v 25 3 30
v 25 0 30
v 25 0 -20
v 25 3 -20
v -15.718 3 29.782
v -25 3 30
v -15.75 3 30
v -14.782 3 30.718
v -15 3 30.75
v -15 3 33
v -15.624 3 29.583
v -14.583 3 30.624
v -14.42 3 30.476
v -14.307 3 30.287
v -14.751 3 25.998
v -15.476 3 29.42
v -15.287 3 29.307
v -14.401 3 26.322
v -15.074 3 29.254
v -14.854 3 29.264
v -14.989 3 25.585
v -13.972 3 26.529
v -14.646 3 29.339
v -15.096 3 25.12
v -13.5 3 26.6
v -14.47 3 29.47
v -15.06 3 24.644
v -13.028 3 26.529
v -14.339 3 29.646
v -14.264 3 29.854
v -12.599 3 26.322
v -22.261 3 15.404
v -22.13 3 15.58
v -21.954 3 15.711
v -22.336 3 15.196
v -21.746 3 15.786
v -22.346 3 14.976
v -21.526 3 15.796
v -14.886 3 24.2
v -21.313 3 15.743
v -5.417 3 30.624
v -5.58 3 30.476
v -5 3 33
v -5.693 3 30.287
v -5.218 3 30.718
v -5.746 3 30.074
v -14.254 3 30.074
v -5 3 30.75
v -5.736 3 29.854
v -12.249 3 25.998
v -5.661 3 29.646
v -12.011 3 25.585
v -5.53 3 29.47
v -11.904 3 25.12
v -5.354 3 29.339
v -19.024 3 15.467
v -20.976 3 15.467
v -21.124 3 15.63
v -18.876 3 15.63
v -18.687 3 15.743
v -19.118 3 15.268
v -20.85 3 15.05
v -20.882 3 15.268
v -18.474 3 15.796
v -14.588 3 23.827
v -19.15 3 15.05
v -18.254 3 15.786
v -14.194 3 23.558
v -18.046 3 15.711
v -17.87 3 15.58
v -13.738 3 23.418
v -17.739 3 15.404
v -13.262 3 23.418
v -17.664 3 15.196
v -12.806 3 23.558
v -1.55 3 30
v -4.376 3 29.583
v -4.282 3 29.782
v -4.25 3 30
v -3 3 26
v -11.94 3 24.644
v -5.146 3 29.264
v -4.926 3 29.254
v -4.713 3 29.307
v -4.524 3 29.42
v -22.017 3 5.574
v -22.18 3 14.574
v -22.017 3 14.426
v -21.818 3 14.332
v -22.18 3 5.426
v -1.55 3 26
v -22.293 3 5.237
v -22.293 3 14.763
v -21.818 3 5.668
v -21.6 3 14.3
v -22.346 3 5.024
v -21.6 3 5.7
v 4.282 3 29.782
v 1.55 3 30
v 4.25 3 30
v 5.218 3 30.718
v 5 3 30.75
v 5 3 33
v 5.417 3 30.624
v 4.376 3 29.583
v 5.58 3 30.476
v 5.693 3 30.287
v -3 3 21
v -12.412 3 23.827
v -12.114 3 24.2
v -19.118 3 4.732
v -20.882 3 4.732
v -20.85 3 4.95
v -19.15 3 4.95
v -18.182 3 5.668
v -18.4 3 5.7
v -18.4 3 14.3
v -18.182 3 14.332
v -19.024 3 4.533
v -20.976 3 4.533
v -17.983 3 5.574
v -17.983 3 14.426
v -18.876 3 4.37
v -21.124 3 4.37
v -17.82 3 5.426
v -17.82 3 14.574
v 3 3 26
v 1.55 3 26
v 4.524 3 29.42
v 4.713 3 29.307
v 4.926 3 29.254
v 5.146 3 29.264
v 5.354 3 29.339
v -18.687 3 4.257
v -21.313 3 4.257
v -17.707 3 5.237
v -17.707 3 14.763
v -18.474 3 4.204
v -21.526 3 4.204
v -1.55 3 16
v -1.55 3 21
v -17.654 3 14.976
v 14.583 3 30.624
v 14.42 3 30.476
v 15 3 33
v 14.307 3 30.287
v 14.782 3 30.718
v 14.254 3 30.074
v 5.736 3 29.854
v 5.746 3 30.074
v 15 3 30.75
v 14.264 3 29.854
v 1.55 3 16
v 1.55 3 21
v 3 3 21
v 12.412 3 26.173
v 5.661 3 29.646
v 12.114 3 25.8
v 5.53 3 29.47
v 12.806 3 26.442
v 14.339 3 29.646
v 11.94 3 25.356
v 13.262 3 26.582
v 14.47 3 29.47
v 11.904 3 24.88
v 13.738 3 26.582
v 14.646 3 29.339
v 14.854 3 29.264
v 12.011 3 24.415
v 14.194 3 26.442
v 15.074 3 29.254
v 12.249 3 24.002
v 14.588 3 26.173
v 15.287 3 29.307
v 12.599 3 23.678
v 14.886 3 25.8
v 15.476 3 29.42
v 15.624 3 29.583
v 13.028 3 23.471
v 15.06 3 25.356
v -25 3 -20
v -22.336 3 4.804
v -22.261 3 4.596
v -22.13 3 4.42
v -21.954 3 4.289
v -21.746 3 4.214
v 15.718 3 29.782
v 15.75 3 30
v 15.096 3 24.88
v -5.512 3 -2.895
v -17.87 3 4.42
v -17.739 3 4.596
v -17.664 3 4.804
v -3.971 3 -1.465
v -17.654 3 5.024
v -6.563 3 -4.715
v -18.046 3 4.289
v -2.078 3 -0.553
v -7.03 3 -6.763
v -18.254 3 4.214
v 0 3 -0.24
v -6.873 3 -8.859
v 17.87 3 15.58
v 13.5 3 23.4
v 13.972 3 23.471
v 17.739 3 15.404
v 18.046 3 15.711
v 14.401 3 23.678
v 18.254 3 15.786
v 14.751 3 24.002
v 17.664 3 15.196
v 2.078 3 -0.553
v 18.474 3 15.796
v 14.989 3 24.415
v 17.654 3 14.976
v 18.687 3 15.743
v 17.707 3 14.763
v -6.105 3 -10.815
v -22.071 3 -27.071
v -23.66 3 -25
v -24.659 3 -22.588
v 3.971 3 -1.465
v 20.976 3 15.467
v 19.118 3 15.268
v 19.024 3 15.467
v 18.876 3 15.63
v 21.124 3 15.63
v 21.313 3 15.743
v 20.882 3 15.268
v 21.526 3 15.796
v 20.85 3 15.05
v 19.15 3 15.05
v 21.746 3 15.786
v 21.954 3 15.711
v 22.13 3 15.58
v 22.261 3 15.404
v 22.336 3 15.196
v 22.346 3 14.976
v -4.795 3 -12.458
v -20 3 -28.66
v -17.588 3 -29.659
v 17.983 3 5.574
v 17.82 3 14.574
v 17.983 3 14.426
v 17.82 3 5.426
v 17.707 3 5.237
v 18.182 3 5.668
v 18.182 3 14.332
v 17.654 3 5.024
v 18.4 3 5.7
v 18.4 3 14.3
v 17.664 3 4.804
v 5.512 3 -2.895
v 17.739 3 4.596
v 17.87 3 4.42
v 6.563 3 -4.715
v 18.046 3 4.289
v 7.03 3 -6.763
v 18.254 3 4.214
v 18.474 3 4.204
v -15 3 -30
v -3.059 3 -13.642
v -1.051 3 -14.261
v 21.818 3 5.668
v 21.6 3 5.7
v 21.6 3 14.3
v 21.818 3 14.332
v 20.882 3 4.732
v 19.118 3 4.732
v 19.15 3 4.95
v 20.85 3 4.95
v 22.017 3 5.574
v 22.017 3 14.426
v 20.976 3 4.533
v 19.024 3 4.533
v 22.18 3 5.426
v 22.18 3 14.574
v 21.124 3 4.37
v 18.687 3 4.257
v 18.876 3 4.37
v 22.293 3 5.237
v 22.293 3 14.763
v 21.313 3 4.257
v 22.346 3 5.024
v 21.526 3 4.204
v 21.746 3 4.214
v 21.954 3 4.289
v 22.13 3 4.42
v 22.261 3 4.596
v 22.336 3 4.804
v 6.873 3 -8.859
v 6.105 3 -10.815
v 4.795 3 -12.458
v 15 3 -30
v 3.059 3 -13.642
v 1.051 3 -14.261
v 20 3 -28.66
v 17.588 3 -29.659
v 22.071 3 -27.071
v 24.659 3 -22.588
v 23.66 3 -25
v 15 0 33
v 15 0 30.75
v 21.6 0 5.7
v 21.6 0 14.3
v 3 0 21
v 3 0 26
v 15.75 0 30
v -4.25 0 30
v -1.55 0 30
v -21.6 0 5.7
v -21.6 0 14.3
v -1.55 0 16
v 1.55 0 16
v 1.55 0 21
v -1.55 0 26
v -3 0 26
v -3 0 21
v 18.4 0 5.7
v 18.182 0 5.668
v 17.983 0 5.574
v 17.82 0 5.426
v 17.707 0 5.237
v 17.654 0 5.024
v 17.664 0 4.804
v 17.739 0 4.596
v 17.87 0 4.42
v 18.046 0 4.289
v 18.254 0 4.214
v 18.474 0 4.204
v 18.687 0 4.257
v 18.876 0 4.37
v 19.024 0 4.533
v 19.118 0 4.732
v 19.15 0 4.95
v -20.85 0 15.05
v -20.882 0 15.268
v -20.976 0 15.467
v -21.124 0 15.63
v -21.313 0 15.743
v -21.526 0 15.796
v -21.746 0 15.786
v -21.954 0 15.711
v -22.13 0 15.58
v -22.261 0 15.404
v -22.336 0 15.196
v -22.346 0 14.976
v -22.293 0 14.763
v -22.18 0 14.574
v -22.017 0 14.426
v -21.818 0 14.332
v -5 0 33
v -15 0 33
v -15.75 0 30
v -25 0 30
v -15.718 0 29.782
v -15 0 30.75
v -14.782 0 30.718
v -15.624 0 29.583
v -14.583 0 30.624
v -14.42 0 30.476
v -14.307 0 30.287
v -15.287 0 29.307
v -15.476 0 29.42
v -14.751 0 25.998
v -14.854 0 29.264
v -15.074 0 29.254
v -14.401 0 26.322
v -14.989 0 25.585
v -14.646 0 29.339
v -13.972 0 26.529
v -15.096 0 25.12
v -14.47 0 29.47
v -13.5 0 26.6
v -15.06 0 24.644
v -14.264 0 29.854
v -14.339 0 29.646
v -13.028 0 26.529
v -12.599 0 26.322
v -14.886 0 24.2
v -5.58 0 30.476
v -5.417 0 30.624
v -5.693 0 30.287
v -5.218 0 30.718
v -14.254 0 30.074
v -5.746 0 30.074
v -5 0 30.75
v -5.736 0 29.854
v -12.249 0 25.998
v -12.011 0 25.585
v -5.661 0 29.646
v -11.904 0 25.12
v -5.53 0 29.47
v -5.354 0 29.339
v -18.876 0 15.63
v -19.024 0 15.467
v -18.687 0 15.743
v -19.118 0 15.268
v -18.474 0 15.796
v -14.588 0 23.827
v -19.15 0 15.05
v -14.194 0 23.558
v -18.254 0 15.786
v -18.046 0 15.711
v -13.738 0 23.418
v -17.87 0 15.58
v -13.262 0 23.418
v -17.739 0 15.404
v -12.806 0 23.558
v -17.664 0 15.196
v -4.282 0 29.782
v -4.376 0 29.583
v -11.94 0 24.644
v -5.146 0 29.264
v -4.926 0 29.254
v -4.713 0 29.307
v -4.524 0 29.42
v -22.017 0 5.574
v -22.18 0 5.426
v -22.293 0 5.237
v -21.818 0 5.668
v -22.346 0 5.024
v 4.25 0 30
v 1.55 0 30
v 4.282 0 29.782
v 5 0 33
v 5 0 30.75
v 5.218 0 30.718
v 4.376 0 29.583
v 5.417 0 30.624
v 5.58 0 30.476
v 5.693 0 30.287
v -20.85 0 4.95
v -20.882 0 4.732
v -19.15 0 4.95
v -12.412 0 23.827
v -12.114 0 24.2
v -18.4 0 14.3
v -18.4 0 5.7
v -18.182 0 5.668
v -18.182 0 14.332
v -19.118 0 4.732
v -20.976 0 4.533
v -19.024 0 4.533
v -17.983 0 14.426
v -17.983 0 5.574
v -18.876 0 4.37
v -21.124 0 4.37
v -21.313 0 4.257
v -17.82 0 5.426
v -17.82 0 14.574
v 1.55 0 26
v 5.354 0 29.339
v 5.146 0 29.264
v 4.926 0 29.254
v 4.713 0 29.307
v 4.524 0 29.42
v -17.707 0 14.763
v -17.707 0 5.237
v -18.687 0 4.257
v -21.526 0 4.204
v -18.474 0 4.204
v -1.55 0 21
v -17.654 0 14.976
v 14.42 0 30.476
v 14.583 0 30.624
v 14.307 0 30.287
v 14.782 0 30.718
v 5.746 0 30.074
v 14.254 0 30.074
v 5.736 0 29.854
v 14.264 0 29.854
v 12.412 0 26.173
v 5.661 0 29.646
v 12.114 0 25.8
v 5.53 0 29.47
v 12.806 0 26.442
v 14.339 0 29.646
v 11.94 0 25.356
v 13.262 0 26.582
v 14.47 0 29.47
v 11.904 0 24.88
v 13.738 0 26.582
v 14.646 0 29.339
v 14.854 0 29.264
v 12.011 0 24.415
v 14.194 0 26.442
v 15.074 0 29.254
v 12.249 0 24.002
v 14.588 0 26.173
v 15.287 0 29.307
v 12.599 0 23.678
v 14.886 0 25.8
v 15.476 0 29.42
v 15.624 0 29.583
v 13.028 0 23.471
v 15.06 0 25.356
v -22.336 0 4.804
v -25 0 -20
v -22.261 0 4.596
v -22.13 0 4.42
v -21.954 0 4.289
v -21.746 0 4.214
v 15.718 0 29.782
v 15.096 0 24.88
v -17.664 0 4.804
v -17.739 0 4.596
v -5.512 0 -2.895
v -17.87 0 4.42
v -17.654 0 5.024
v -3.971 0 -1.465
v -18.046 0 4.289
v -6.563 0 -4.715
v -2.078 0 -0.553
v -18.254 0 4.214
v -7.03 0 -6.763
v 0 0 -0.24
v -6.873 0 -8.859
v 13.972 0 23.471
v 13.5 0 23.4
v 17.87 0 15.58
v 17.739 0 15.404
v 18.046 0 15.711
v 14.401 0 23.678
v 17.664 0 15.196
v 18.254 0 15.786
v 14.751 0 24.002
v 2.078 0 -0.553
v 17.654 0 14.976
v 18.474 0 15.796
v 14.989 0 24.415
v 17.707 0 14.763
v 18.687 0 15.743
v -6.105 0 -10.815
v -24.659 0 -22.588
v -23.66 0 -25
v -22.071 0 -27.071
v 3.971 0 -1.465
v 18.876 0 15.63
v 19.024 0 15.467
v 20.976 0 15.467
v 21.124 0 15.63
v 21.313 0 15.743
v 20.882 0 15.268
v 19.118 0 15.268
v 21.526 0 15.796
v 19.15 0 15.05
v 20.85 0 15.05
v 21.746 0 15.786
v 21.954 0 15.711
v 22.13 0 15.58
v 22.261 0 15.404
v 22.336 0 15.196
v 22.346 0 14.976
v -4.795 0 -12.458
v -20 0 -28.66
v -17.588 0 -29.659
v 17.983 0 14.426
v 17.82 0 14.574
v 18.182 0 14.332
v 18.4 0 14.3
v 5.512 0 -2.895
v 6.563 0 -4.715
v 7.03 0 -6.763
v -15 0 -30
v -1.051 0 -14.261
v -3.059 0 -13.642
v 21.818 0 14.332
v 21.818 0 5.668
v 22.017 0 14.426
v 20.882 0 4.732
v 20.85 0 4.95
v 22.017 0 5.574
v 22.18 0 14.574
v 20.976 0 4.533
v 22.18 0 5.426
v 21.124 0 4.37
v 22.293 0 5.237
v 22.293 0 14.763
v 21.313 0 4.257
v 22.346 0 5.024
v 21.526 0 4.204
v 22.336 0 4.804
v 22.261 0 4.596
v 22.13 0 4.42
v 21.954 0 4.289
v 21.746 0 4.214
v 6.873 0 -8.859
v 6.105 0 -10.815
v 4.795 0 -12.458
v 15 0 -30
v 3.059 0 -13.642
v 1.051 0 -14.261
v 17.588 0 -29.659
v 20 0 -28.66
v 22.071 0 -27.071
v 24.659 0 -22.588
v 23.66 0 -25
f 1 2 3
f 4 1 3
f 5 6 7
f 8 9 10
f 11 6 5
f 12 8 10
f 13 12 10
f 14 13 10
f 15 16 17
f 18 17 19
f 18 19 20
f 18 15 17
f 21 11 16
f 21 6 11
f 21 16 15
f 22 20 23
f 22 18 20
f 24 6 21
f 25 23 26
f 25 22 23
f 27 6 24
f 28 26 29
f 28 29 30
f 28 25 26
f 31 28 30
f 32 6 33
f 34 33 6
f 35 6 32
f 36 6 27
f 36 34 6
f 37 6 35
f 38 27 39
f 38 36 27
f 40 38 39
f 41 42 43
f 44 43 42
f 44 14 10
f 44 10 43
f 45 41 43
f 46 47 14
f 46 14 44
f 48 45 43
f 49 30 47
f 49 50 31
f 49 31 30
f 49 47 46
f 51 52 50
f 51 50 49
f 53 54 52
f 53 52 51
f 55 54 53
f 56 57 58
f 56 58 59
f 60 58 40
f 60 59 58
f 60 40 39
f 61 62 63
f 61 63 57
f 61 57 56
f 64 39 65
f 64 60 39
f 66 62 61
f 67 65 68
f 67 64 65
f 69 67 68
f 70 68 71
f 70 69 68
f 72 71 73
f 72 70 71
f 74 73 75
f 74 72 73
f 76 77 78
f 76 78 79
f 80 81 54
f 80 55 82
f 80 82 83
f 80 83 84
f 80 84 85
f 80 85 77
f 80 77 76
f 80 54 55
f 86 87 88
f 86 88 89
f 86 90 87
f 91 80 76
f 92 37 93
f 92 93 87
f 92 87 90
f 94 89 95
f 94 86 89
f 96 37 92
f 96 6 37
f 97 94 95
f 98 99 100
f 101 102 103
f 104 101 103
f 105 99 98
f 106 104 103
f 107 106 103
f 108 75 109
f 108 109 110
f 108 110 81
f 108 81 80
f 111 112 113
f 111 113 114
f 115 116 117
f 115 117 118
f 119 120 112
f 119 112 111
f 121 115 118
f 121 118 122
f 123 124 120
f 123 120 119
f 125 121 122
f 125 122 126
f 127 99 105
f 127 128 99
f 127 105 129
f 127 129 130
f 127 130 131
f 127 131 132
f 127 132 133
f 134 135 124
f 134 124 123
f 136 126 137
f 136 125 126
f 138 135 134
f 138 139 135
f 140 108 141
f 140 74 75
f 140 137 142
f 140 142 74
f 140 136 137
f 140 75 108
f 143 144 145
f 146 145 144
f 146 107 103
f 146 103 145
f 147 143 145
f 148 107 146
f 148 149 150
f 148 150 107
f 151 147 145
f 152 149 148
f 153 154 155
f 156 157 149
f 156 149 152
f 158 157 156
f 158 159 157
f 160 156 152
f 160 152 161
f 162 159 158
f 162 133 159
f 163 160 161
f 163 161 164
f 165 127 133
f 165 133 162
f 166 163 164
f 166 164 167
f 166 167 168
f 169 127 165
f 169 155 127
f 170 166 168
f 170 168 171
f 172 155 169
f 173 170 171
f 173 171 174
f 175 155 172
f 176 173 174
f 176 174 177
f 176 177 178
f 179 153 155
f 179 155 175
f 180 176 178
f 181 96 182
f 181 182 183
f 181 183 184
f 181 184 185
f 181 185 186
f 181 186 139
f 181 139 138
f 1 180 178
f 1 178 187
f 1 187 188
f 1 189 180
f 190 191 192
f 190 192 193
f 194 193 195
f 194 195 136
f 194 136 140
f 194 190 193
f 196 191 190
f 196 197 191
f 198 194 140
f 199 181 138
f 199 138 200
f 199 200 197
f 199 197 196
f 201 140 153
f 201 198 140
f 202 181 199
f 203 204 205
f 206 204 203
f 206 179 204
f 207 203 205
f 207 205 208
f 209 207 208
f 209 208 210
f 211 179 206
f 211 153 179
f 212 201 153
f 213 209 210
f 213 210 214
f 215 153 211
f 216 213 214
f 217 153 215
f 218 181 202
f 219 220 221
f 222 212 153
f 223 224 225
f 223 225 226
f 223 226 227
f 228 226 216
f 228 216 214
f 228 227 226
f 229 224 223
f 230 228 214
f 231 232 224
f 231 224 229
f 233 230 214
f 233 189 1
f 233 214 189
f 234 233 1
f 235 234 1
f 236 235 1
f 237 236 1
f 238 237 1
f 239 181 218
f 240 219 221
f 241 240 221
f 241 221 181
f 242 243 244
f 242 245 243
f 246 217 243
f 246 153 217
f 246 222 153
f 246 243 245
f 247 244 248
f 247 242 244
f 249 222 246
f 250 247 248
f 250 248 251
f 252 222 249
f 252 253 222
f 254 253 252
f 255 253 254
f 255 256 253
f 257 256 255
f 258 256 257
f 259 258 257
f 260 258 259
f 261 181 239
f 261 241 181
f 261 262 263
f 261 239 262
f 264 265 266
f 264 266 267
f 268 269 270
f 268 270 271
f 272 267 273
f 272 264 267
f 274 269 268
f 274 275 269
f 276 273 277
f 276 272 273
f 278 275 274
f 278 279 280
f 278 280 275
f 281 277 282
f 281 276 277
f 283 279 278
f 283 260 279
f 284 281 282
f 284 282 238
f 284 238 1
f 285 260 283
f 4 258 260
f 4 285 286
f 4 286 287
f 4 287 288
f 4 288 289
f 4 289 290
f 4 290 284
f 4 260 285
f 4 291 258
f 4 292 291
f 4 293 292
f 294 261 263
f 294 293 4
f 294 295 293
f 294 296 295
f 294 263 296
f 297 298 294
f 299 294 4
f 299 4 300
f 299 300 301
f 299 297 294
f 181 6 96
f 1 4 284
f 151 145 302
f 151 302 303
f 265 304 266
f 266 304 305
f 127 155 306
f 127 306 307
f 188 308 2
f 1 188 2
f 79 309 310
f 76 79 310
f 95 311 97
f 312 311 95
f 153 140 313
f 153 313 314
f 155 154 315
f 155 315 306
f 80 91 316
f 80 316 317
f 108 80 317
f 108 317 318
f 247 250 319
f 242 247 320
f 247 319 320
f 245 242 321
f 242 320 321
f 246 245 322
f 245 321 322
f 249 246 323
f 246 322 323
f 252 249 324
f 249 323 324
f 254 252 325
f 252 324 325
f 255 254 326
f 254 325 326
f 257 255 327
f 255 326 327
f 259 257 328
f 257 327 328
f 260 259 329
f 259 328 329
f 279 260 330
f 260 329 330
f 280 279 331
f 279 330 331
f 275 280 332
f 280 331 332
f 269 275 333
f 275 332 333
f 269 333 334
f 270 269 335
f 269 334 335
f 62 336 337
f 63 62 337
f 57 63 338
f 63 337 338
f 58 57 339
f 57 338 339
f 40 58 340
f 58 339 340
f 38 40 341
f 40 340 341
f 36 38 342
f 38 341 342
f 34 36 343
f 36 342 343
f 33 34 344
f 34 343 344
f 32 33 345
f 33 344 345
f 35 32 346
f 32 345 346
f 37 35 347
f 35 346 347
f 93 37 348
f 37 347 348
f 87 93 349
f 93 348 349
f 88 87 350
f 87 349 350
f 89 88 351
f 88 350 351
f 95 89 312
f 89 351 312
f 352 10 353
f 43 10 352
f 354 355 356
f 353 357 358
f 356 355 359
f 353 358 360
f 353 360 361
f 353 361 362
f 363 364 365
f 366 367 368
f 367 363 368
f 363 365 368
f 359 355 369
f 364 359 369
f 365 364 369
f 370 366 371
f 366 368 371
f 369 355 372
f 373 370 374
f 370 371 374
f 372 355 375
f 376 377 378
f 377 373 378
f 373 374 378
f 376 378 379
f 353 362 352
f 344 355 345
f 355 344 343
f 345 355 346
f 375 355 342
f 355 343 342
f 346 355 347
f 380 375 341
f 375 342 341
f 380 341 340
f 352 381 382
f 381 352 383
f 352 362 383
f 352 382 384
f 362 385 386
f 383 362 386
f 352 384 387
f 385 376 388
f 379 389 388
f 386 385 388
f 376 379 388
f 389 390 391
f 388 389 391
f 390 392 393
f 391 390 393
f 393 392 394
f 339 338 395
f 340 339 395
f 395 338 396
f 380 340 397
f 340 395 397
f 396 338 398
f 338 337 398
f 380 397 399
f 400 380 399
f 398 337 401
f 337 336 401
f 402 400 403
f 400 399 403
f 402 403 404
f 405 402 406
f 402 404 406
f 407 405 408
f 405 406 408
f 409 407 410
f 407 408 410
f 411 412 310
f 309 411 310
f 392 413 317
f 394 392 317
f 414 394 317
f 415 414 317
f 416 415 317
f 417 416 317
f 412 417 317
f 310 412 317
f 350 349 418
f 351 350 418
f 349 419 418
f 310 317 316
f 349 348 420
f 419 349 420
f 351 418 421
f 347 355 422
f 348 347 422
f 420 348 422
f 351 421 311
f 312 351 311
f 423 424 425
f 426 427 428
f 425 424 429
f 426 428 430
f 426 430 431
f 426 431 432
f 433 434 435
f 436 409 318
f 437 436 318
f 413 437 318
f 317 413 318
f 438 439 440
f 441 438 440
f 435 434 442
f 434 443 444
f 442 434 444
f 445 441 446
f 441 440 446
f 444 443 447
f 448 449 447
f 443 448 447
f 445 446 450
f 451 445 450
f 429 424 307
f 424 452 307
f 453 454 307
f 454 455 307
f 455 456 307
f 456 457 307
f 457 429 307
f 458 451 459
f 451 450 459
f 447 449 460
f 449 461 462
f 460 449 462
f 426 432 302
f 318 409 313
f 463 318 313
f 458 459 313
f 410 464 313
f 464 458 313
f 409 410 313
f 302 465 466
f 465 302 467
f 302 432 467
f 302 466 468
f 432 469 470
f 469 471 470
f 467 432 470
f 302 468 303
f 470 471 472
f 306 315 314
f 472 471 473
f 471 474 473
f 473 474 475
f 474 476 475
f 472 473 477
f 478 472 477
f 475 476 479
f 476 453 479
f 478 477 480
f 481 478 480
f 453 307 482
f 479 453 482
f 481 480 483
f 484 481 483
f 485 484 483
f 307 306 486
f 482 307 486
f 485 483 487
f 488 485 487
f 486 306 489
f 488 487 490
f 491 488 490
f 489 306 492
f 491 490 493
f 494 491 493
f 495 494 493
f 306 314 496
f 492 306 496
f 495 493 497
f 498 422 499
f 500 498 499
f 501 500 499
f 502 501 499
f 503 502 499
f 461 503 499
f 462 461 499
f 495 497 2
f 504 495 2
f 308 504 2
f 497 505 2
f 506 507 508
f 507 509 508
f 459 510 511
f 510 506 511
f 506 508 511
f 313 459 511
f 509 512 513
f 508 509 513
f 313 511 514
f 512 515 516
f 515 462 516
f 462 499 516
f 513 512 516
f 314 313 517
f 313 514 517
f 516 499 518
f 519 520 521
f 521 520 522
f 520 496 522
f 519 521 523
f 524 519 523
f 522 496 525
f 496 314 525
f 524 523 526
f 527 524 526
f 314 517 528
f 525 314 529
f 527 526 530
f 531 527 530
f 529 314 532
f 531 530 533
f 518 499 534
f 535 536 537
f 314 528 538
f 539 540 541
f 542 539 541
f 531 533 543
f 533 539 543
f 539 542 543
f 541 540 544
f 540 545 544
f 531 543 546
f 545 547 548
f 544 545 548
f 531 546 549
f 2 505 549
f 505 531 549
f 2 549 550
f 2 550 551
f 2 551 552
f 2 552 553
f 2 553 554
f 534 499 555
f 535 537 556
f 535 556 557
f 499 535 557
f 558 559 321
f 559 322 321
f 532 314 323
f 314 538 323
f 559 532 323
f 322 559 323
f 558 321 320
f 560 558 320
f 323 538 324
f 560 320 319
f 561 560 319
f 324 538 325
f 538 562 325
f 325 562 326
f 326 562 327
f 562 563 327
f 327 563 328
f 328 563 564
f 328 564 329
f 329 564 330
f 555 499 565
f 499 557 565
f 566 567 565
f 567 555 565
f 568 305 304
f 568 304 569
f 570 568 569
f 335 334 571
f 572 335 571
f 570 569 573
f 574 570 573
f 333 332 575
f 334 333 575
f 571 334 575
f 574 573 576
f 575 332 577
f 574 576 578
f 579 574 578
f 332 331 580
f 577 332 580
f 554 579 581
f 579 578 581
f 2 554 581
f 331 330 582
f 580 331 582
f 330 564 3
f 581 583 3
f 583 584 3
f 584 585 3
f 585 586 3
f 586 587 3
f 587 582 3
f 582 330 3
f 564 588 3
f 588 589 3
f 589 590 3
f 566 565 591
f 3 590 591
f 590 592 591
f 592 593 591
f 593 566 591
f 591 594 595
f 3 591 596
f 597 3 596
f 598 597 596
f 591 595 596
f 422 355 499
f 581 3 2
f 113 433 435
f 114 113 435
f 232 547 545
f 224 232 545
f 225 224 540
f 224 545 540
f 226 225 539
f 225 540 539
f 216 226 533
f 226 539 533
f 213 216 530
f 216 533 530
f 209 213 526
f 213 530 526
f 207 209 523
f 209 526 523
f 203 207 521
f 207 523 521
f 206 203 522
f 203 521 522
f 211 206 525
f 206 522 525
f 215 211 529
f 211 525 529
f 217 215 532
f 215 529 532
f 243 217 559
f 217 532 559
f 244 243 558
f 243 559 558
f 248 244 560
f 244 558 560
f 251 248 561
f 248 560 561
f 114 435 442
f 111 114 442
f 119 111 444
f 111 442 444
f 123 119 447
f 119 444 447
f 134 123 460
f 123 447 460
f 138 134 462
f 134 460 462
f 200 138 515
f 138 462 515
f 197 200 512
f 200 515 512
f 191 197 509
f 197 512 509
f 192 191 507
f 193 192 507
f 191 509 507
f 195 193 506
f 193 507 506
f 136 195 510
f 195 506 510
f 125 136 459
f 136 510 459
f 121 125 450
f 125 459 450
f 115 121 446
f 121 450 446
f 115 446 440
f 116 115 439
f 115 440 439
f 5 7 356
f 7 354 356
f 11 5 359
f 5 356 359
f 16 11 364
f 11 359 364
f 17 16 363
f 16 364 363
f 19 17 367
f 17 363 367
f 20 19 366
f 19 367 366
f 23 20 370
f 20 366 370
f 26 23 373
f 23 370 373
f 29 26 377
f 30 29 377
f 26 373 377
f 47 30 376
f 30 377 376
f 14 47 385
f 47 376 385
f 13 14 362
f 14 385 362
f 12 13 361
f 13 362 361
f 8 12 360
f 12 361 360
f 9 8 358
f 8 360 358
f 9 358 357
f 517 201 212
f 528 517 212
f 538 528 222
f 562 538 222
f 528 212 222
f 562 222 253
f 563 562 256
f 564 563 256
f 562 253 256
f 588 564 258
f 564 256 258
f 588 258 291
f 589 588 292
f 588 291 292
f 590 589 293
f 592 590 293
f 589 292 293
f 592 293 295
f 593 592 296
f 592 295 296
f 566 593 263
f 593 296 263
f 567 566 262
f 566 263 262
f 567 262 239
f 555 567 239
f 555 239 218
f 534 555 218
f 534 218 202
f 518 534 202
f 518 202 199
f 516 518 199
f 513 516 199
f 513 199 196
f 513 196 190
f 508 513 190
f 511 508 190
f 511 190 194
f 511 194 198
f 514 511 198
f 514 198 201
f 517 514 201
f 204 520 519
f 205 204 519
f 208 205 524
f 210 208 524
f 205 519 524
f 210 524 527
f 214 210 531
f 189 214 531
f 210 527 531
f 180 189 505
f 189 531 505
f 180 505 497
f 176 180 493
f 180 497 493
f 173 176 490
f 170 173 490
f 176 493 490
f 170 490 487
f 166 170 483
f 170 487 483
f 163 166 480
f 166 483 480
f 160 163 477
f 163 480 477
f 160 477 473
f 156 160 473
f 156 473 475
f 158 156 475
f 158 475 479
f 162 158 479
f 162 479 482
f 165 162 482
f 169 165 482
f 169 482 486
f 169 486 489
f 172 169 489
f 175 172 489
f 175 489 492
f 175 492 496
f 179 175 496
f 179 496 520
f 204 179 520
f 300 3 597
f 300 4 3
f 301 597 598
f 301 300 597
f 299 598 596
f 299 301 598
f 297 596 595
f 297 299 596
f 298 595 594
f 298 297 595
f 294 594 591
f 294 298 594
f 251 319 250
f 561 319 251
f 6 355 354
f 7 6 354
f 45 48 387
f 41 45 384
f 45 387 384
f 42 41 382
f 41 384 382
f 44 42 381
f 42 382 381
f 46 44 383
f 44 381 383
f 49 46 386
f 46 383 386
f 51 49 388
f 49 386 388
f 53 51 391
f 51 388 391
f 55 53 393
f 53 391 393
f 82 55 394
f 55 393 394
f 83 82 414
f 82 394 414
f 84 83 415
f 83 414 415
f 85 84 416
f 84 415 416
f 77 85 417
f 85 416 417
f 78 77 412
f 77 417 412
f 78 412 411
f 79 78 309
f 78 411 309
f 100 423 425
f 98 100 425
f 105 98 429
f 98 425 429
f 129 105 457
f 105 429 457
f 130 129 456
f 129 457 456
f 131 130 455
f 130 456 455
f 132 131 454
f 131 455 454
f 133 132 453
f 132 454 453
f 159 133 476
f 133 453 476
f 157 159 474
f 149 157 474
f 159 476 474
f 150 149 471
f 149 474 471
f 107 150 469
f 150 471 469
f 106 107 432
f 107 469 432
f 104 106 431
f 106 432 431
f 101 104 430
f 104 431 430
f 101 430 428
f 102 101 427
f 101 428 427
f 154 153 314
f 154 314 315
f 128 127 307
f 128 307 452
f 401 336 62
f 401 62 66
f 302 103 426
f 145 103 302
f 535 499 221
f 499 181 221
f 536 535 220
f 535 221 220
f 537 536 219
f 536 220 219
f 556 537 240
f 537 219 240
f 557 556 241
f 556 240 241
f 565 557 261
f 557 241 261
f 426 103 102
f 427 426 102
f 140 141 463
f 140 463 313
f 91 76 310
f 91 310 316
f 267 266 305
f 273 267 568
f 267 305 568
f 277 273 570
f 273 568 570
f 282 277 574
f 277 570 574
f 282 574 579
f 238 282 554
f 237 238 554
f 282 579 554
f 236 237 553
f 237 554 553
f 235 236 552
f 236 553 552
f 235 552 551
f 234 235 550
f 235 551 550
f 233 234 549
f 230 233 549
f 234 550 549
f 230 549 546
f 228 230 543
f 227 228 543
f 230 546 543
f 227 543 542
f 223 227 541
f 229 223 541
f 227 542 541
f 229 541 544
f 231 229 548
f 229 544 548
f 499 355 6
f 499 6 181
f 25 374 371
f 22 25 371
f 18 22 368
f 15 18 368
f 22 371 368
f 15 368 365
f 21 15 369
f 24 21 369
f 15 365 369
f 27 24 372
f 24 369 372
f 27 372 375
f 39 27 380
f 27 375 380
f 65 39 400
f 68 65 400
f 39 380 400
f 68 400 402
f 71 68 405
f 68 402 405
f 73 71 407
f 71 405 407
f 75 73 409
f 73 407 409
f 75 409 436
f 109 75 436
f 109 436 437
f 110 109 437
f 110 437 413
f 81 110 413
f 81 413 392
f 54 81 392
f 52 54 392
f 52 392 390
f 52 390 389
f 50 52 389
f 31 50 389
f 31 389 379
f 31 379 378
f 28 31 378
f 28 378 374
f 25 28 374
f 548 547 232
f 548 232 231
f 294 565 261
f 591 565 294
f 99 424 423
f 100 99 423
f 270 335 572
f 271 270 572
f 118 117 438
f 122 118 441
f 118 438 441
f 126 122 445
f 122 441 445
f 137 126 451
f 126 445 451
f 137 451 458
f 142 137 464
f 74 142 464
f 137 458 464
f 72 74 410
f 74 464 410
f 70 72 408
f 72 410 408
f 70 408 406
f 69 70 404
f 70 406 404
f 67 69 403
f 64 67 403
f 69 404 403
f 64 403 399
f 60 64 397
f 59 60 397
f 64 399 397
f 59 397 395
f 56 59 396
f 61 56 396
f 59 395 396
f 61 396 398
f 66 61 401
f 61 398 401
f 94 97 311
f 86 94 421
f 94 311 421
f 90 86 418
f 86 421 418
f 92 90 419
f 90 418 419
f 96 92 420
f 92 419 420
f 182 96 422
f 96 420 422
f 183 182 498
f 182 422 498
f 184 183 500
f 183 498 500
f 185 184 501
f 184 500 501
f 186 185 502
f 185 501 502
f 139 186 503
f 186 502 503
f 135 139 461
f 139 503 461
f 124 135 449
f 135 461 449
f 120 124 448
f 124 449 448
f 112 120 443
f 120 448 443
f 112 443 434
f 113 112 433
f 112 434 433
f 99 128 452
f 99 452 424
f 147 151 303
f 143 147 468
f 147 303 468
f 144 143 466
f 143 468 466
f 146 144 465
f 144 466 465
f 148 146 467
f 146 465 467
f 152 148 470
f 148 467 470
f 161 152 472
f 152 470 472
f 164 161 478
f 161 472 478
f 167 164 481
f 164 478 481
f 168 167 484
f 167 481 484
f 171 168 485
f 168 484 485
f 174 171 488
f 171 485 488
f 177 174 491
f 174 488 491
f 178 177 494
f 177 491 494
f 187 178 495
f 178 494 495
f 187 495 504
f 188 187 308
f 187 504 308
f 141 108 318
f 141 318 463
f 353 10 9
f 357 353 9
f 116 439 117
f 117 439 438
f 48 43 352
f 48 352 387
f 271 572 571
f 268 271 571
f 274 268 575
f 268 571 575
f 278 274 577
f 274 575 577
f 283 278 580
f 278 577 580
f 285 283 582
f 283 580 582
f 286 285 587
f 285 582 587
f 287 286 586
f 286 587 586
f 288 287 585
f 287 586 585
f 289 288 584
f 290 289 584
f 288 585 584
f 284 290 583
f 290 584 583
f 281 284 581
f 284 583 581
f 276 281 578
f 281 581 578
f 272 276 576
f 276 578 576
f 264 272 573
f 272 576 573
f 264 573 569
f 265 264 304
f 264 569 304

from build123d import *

# Parameters (mm, degrees)
SKETCH_1_W          = 50
SKETCH_1_H          = 60
EXTRUDE_1_DEPTH     = 3
SKETCH_2_W          = 10
SKETCH_2_H          = 3
EXTRUDE_2_DEPTH     = 3
CUT_EXTRUDE_1_DEPTH = 42.509035161
SKETCH_4_R          = 7.05
CUT_EXTRUDE_2_DEPTH = 42.509035161
SKETCH_5_R          = 1.6
SKETCH_5_W          = 3.2
SKETCH_5_H          = 10.1
CUT_EXTRUDE_3_DEPTH = 42.509035161
SKETCH_7_R          = 0.75
CUT_EXTRUDE_4_DEPTH = 42.509035161
FILLET_1_R          = 10


with BuildPart() as part:
    # 草图1 → 凸台-拉伸1 (new body)
    with BuildSketch(Plane(origin=(0, 0, 0), x_dir=(1, 0, 0), z_dir=(0, 1, 0))):
        Rectangle(SKETCH_1_W, SKETCH_1_H)
    extrude(amount=EXTRUDE_1_DEPTH)

    # 草图2 → 凸台-拉伸2 (add)
    with BuildSketch(Plane(origin=(0, 3, 0), x_dir=(1, 0, 0), z_dir=(0, 1, 0))):
        with Locations((-10, -31.5)):
            Rectangle(SKETCH_2_W, SKETCH_2_H)
        with Locations((10, -31.5)):
            Rectangle(SKETCH_2_W, SKETCH_2_H)
    extrude(amount=-EXTRUDE_2_DEPTH)

    # 草图3 → 切除-拉伸1 (cut, through all)
    with BuildSketch(Plane(origin=(0, 3, 0), x_dir=(1, 0, 0), z_dir=(0, 1, 0))):
        Polygon((-1.55, -30), (-1.55, -26), (-3, -26), (-3, -21), (-1.55, -21), (-1.55, -16), (1.55, -16), (1.55, -21), (3, -21), (3, -26), (1.55, -26), (1.55, -30), align=None)
    extrude(amount=-CUT_EXTRUDE_1_DEPTH, mode=Mode.SUBTRACT)

    # 草图4 → 切除-拉伸2 (cut, through all)
    with BuildSketch(Plane(origin=(0, 3, 0), x_dir=(1, 0, 0), z_dir=(0, 1, 0))):
        with Locations(Location((0, 7.290233074, 0), (0, 0, 270))):
            Circle(SKETCH_4_R)
    extrude(amount=-CUT_EXTRUDE_2_DEPTH, mode=Mode.SUBTRACT)

    # 草图5 → 切除-拉伸3 (cut, through all)
    with BuildSketch(Plane.XZ):
        with Locations(Location((13.5, 25, 0), (0, 0, 270))):
            Circle(SKETCH_5_R)
        with Locations(Location((-13.5, 25, 0), (0, 0, 90))):
            Circle(SKETCH_5_R)
        with Locations((20, 10)):
            Rectangle(SKETCH_5_W, SKETCH_5_H)
        with Locations((-20, 10)):
            Rectangle(SKETCH_5_W, SKETCH_5_H)
    extrude(amount=-CUT_EXTRUDE_3_DEPTH, mode=Mode.SUBTRACT)

    # 草图7 → 切除-拉伸4 (cut, through all)
    with BuildSketch(Plane.XZ):
        with Locations((-21.6, 15.05)):
            Circle(SKETCH_7_R)
        with Locations((-18.4, 15.05)):
            Circle(SKETCH_7_R)
        with Locations((-18.4, 4.95)):
            Circle(SKETCH_7_R)
        with Locations((-21.6, 4.95)):
            Circle(SKETCH_7_R)
        with Locations((21.6, 4.95)):
            Circle(SKETCH_7_R)
        with Locations((18.4, 4.95)):
            Circle(SKETCH_7_R)
        with Locations((18.4, 15.05)):
            Circle(SKETCH_7_R)
        with Locations((21.6, 15.05)):
            Circle(SKETCH_7_R)
        with Locations((-15, 30)):
            Circle(SKETCH_7_R)
        with Locations((-5, 30)):
            Circle(SKETCH_7_R)
        with Locations((5, 30)):
            Circle(SKETCH_7_R)
        with Locations((15, 30)):
            Circle(SKETCH_7_R)
    extrude(amount=-CUT_EXTRUDE_4_DEPTH, mode=Mode.SUBTRACT)

    # 圆角1
    fillet_1_edges = [part.edges().sort_by_distance(p)[0] for p in [
        (-25, 1.5, -30),
        (25, 1.5, -30),
    ]]
    fillet(fillet_1_edges, radius=FILLET_1_R)


solid = part.part
